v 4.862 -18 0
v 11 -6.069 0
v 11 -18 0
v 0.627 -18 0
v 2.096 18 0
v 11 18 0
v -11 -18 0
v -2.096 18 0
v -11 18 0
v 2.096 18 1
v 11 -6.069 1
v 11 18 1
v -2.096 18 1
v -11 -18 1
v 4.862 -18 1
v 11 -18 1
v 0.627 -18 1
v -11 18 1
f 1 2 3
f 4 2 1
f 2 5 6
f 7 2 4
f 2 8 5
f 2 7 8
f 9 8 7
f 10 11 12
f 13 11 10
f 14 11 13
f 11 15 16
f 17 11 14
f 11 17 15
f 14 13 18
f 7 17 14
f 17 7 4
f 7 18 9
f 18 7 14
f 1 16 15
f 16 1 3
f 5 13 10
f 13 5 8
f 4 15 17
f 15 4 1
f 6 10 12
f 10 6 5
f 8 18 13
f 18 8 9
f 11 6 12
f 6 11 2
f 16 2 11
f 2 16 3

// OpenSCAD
// Module names are of the form poly_<inkscape-path-id>().  As a result,
// you can associate a polygon in this OpenSCAD program with the corresponding
// SVG element in the Inkscape document by looking for the XML element with
// the attribute id="inkscape-path-id".

// fudge value is used to ensure that subtracted solids are a tad taller
// in the z dimension than the polygon being subtracted from.  This helps
// keep the resulting .stl file manifold.
fudge = 0.1;

module poly_path3442(h)
{
  scale([25.4/90, -25.4/90, 1]) union()
  {
    linear_extrude(height=h)
      polygon([[35.446744,-43.932999],[32.753868,-47.790245],[29.692586,-51.448744],[26.210267,-54.811237],[22.254283,-57.780464],[17.772004,-60.259166],[12.710801,-62.150084],[7.018043,-63.355958],[0.641102,-63.779529],[-2.584647,-63.612497],[-5.752129,-63.119857],[-8.840666,-62.314297],[-11.829583,-61.208501],[-14.698204,-59.815156],[-17.425853,-58.146948],[-19.991854,-56.216563],[-22.375532,-54.036687],[-24.556210,-51.620005],[-26.513213,-48.979205],[-28.225865,-46.126971],[-29.673489,-43.075990],[-30.835411,-39.838947],[-31.690954,-36.428530],[-32.219441,-32.857423],[-32.400199,-29.138313],[-32.202838,-25.226666],[-31.633312,-21.601776],[-30.725453,-18.250164],[-29.513095,-15.158349],[-28.030071,-12.312855],[-26.310214,-9.700201],[-22.295335,-5.119501],[-17.739124,-1.308417],[-12.912247,1.840880],[-8.085370,4.436223],[-3.529159,6.585441],[4.899079,10.704160],[8.281464,12.684232],[11.086805,14.772135],[13.298184,17.088386],[14.898684,19.753501],[15.871390,22.887998],[16.199385,26.612394],[15.923706,29.664785],[15.106696,32.323910],[13.763391,34.585540],[11.908827,36.445448],[9.558043,37.899403],[6.726075,38.943179],[3.427960,39.572545],[-0.321266,39.783273],[-4.311396,39.458371],[-7.882370,38.537227],[-11.066142,37.100186],[-13.894664,35.227592],[-16.399891,32.999791],[-18.613776,30.497127],[-22.295335,24.988587],[-38.976380,40.324542],[-37.973287,42.990010],[-35.643178,46.425095],[-32.102591,50.283046],[-27.468063,54.217113],[-21.856129,57.880546],[-15.383327,60.926594],[-11.860518,62.109738],[-8.166194,63.008506],[-4.314921,63.579552],[-0.321266,63.779532],[6.899940,63.211129],[13.961378,61.498873],[17.354062,60.210496],[20.613057,58.632191],[23.707116,56.762637],[26.604989,54.600512],[29.275427,52.144495],[31.687181,49.393265],[33.809004,46.345499],[35.609645,42.999877],[37.057857,39.355077],[38.122391,35.409777],[38.771997,31.162657],[38.975427,26.612394],[38.768042,21.789383],[38.165935,17.383687],[37.199181,13.368615],[35.897854,9.717472],[34.292028,6.403565],[32.411777,3.400200],[30.287174,0.680684],[27.948294,-1.781675],[22.747998,-6.041702],[17.051481,-9.593428],[11.099336,-12.650399],[5.132153,-15.426165],[-1.614448,-18.761171],[-4.138158,-20.288071],[-6.135572,-21.808628],[-7.636766,-23.388387],[-8.671813,-25.092891],[-9.270787,-26.987685],[-9.463762,-29.138313],[-9.266401,-31.468307],[-8.696875,-33.569953],[-7.789016,-35.417879],[-6.576658,-36.986713],[-5.093634,-38.251084],[-3.373777,-39.185619],[-1.450920,-39.764946],[0.641102,-39.963693],[4.105878,-39.710325],[7.096987,-38.985462],[9.697135,-37.841961],[11.989025,-36.332680],[14.055359,-34.510478],[15.978842,-32.428213],[19.728067,-27.694929],[35.446744,-43.932999]]);
  }
}

module poly_path3394(h)
{
  scale([25.4/90, -25.4/90, 1]) union()
  {
    linear_extrude(height=h)
      polygon([[24.554496,18.417140],[22.426617,23.400624],[20.142845,27.733442],[17.698808,31.411340],[15.090136,34.430065],[12.312457,36.785366],[9.361401,38.472989],[6.232597,39.488681],[2.921673,39.828190],[0.540498,39.627072],[-1.791323,39.035766],[-4.059403,38.072346],[-6.249353,36.754888],[-8.346787,35.101464],[-10.337318,33.130149],[-13.940117,28.306142],[-16.942652,22.427459],[-19.229824,15.638693],[-20.686533,8.084436],[-21.197680,-0.090719],[-20.732427,-7.737117],[-19.387175,-15.026287],[-17.237685,-21.754097],[-14.359719,-27.716417],[-10.829039,-32.709115],[-8.842606,-34.778066],[-6.721406,-36.528062],[-4.474907,-37.933587],[-2.112581,-38.969125],[0.356102,-39.609160],[2.921673,-39.828176],[6.052663,-39.530131],[9.017560,-38.634578],[11.825107,-37.139391],[14.484044,-35.042443],[17.003114,-32.341609],[19.391058,-29.034761],[21.656618,-25.119774],[23.808536,-20.594521],[37.608785,-35.654836],[34.812894,-41.447755],[31.419653,-46.785633],[27.507737,-51.570657],[23.155822,-55.705014],[18.442582,-59.090891],[13.446694,-61.630476],[8.246833,-63.225957],[2.921673,-63.779520],[-1.769469,-63.413121],[-6.231870,-62.345288],[-10.455331,-60.623068],[-14.429653,-58.293505],[-18.144637,-55.403646],[-21.590086,-52.000536],[-24.755800,-48.131222],[-27.631580,-43.842748],[-30.207228,-39.182160],[-32.472546,-34.196505],[-34.417334,-28.932829],[-36.031394,-23.438176],[-37.304527,-17.759593],[-38.226534,-11.944125],[-38.787218,-6.038818],[-38.976379,-0.090719],[-38.761266,6.397655],[-38.129647,12.708211],[-37.102101,18.807725],[-35.699209,24.662974],[-33.941548,30.240732],[-31.849699,35.507776],[-29.444241,40.430881],[-26.745753,44.976822],[-23.774816,49.112375],[-20.552008,52.804315],[-17.097909,56.019419],[-13.433098,58.724462],[-9.578155,60.886220],[-5.553659,62.471467],[-1.380190,63.446980],[2.921673,63.779534],[5.775630,63.620323],[8.596258,63.152257],[14.097466,61.346976],[19.345164,58.478513],[24.259220,54.661693],[28.759502,50.011339],[32.765877,44.642274],[36.198213,38.669323],[38.976377,32.207308],[24.554496,18.417140]]);
  }
}

module poly_path3464(h)
{
  scale([25.4/90, -25.4/90, 1]) union()
  {
    linear_extrude(height=h)
      polygon([[34.154558,63.779526],[34.154558,39.725532],[-8.208574,39.725532],[38.976378,-63.779535],[-28.529101,-63.779535],[-28.529101,-39.725540],[8.323380,-39.725540],[-38.976378,63.779526],[34.154558,63.779526]]);
  }
}

module poly_path3406(h)
{
  scale([25.4/90, -25.4/90, 1]) union()
  {
    linear_extrude(height=h)
      polygon([[38.976373,-6.985807],[-0.507841,-6.985807],[-0.507841,16.965537],[20.948211,16.965537],[20.948211,28.578310],[19.014072,31.353921],[17.020421,33.704260],[14.967257,35.646338],[12.854582,37.197164],[10.682395,38.373752],[8.450696,39.193110],[6.159485,39.672250],[3.808762,39.828183],[1.377170,39.627065],[-1.004022,39.035759],[-3.320122,38.072340],[-5.556440,36.754881],[-7.698282,35.101457],[-9.730957,33.130142],[-13.410037,28.306135],[-16.476144,22.427452],[-18.811741,15.638687],[-20.299293,8.084431],[-20.821262,-0.090723],[-20.299293,-8.258081],[-18.811741,-15.791782],[-16.476144,-22.551488],[-13.410037,-28.396857],[-9.730957,-33.187551],[-7.698282,-35.143539],[-5.556440,-36.783230],[-3.320122,-38.089082],[-1.004022,-39.043553],[1.377170,-39.629100],[3.808762,-39.828181],[6.601857,-39.597470],[9.275929,-38.901087],[11.842878,-37.732651],[14.314609,-36.085783],[16.703023,-33.954105],[19.020023,-31.331237],[21.277511,-28.210801],[23.487389,-24.586416],[36.183277,-41.642676],[33.349763,-46.240580],[30.035690,-50.459992],[26.308008,-54.228614],[22.233670,-57.474152],[17.879625,-60.124308],[13.312824,-62.106786],[8.600220,-63.349291],[3.808762,-63.779525],[-0.584183,-63.449008],[-4.846016,-62.479254],[-8.955721,-60.902955],[-12.892283,-58.752804],[-16.634688,-56.061494],[-20.161919,-52.861718],[-23.452962,-49.186168],[-26.486802,-45.067537],[-29.242424,-40.538518],[-31.698812,-35.631805],[-33.834951,-30.380089],[-35.629826,-24.816063],[-37.062422,-18.972421],[-38.111723,-12.881855],[-38.756715,-6.577058],[-38.976383,-0.090723],[-38.756715,6.397649],[-38.111723,12.708205],[-37.062422,18.807719],[-35.629826,24.662968],[-33.834951,30.240726],[-31.698812,35.507770],[-29.242424,40.430874],[-26.486802,44.976815],[-23.452962,49.112368],[-20.161919,52.804309],[-16.634688,56.019413],[-12.892283,58.724456],[-8.955721,60.886213],[-4.846016,62.471460],[-0.584183,63.446973],[3.808762,63.779527],[8.668162,63.331219],[13.570710,61.996218],[18.428623,59.789409],[23.154122,56.725675],[27.659426,52.819902],[31.856756,48.086974],[35.658332,42.541776],[38.976373,36.199192],[38.976373,-6.985807]]);
  }
}

module poly_path3391(h)
{
  scale([25.4/90, -25.4/90, 1]) union()
  {
    difference()
    {
       linear_extrude(height=h)
         polygon([[-38.976375,-63.779520],[-38.976375,63.779530],[2.220661,63.779530],[6.091071,63.558998],[9.823962,62.912171],[13.403853,61.861206],[16.815266,60.428258],[20.042720,58.635482],[23.070738,56.505034],[25.883838,54.059070],[28.466542,51.319745],[30.803370,48.309214],[32.878843,45.049634],[34.677482,41.563159],[36.183807,37.871946],[37.382339,33.998150],[38.257598,29.963926],[38.794105,25.791430],[38.976381,21.502817],[38.688030,16.187619],[37.846908,11.064613],[36.488908,6.172240],[34.649926,1.548936],[32.365855,-2.766860],[29.672589,-6.736708],[26.606023,-10.322171],[23.202051,-13.484810],[24.834043,-17.334359],[26.035304,-21.457250],[26.777119,-25.785146],[27.030772,-30.249713],[26.453771,-36.974680],[24.798149,-43.253333],[22.176971,-48.946866],[18.703304,-53.916472],[14.490215,-58.023347],[12.141721,-59.709883],[9.650772,-61.128684],[7.031501,-62.262398],[4.298041,-63.093677],[1.464526,-63.605167],[-1.454911,-63.779520],[-38.976375,-63.779520]]);
       translate([0, 0, -fudge])
         linear_extrude(height=h+2*fudge)
           polygon([[-17.076092,-20.956125],[-17.076092,-39.725528],[-1.454911,-39.725528],[-0.204595,-39.550063],[0.995470,-39.039329],[3.101266,-37.106012],[4.575324,-34.113499],[4.985715,-32.278770],[5.130488,-30.249713],[4.599253,-26.491277],[3.177841,-23.552863],[1.124689,-21.639477],[-0.058027,-21.131234],[-1.301763,-20.956125],[-17.076092,-20.956125]]);
       translate([0, 0, -fudge])
         linear_extrude(height=h+2*fudge)
           polygon([[-17.076092,39.725538],[-17.076092,3.280094],[2.526958,3.280094],[5.438581,3.637074],[8.159964,4.666729],[10.630087,6.307131],[12.787930,8.496349],[14.572473,11.172455],[15.922695,14.273522],[16.777577,17.737618],[17.076097,21.502817],[16.736897,25.828578],[15.740831,29.526509],[14.120205,32.617965],[11.907324,35.124301],[9.134493,37.066872],[5.834016,38.467032],[2.038198,39.346136],[-2.220656,39.725538],[-17.076092,39.725538]]);
    }
  }
}

module poly_path3412(h)
{
  scale([25.4/90, -25.4/90, 1]) union()
  {
    linear_extrude(height=h)
      polygon([[-38.976378,63.779534],[-10.629922,63.779534],[-10.629922,-63.779527],[-38.976378,-63.779527],[-38.976378,63.779534]]);
  }
}

module poly_path3418(h)
{
  scale([25.4/90, -25.4/90, 1]) union()
  {
    linear_extrude(height=h)
      polygon([[-20.761927,63.779532],[-20.761927,11.811028],[-15.412228,4.724414],[16.431218,63.779532],[38.976378,63.779532],[-2.420102,-12.537852],[35.664659,-63.416107],[10.062529,-63.416107],[-20.761927,-22.168379],[-20.761927,-63.779523],[-38.976378,-63.779523],[-38.976378,63.779532],[-20.761927,63.779532]]);
  }
}

module poly_path3424(h)
{
  scale([25.4/90, -25.4/90, 1]) union()
  {
    linear_extrude(height=h)
      polygon([[38.976381,-63.779526],[24.170966,-63.779526],[-0.056078,9.603167],[-24.170959,-63.779526],[-38.976375,-63.779526],[-38.976375,63.054758],[-22.937175,63.054758],[-22.937175,-5.979331],[-0.056078,63.779526],[22.937181,-5.798139],[22.937181,63.054758],[38.976381,63.054758],[38.976381,-63.779526]]);
  }
}

module poly_path3461(h)
{
  scale([25.4/90, -25.4/90, 1]) union()
  {
    linear_extrude(height=h)
      polygon([[19.921259,-63.779535],[-0.000000,-20.591681],[-19.921260,-63.779535],[-38.976378,-63.779535],[-7.687008,4.008995],[-7.687008,63.779526],[7.687008,63.779526],[7.687008,4.008995],[38.976377,-63.779535],[19.921259,-63.779535]]);
  }
}

module poly_path3430(h)
{
  scale([25.4/90, -25.4/90, 1]) union()
  {
    difference()
    {
       linear_extrude(height=h)
         polygon([[-0.000002,-63.779523],[-4.066601,-63.444544],[-7.997076,-62.462495],[-11.774009,-60.867714],[-15.379982,-58.694537],[-18.797576,-55.977301],[-22.009372,-52.750341],[-24.997953,-49.047995],[-27.745898,-44.904599],[-30.235791,-40.354489],[-32.450211,-35.432002],[-34.371741,-30.171474],[-35.982961,-24.607241],[-37.266454,-18.773641],[-38.204800,-12.705009],[-38.780582,-6.435682],[-38.976380,0.000004],[-38.775744,6.495579],[-38.186737,12.809357],[-37.228714,18.908600],[-35.921028,24.760566],[-34.283035,30.332518],[-32.334087,35.591715],[-30.093539,40.505418],[-27.580744,45.040889],[-24.815057,49.165386],[-21.815832,52.846172],[-18.602423,56.050507],[-15.194183,58.745651],[-11.610468,60.898865],[-7.870629,62.477409],[-3.994023,63.448545],[-0.000002,63.779532],[3.522265,63.504441],[7.048725,62.686089],[10.547444,61.334858],[13.986489,59.461126],[17.333925,57.075277],[20.557818,54.187689],[23.626233,50.808744],[26.507238,46.948823],[29.168897,42.618307],[31.579276,37.827576],[33.706442,32.587011],[35.518460,26.906992],[36.983397,20.797902],[38.069318,14.270120],[38.744289,7.334027],[38.976375,0.000004],[38.775739,-6.525515],[38.186732,-12.861519],[37.228709,-18.976066],[35.921024,-24.837216],[34.283030,-30.413027],[32.334082,-35.671559],[30.093534,-40.580870],[27.580740,-45.109021],[24.815053,-49.224069],[21.815828,-52.894075],[18.602418,-56.087097],[15.194179,-58.771195],[11.610463,-60.914427],[7.870625,-62.484854],[3.994018,-63.450532],[-0.000002,-63.779523]]);
       translate([0, 0, -fudge])
         linear_extrude(height=h+2*fudge)
           polygon([[-0.000002,-39.794060],[2.329359,-39.592699],[4.601949,-39.000862],[6.804864,-38.036913],[8.925203,-36.719219],[10.950061,-35.066146],[12.866538,-33.096060],[16.322732,-28.278312],[19.190565,-22.412904],[21.366815,-15.646763],[22.748260,-8.126818],[23.231680,0.000004],[22.694069,8.857207],[21.181016,16.719985],[18.842193,23.530843],[15.827270,29.232288],[12.285918,33.766826],[8.367808,37.076965],[6.314241,38.254918],[4.222611,39.105210],[2.111627,39.620656],[-0.000002,39.794068],[-2.347508,39.590712],[-4.633565,38.993417],[-6.845754,38.021350],[-8.971657,36.693675],[-10.998854,35.029555],[-12.914927,33.048157],[-16.364025,28.210180],[-19.219601,22.333060],[-21.382303,15.570113],[-22.752781,8.074656],[-23.231685,0.000004],[-22.757297,-8.022477],[-21.397786,-15.493447],[-19.248632,-22.253199],[-16.405314,-28.142031],[-12.963312,-33.000237],[-11.047642,-34.992948],[-9.018107,-36.668114],[-6.886640,-38.005771],[-4.665177,-38.985956],[-2.365653,-39.588707],[-0.000002,-39.794060]]);
    }
  }
}

module poly_path3409(h)
{
  scale([25.4/90, -25.4/90, 1]) union()
  {
    linear_extrude(height=h)
      polygon([[19.454057,63.779534],[38.976376,63.779534],[38.976376,-63.779527],[19.454057,-63.779527],[19.454057,-12.573676],[-19.454062,-12.573676],[-19.454062,-63.779527],[-38.976381,-63.779527],[-38.976381,63.779534],[-19.454062,63.779534],[-19.454062,11.480318],[19.454057,11.480318],[19.454057,63.779534]]);
  }
}

module poly_path3436(h)
{
  scale([25.4/90, -25.4/90, 1]) union()
  {
    difference()
    {
       linear_extrude(height=h)
         polygon([[18.371679,63.416113],[38.976379,63.416113],[24.969243,40.339190],[28.218860,31.966424],[30.716736,22.418233],[32.320135,11.745724],[32.886320,0.000002],[32.701358,-6.495573],[32.158367,-12.809351],[31.275190,-18.908593],[30.069667,-24.760560],[28.559642,-30.332511],[26.762956,-35.591709],[24.697450,-40.505412],[22.380968,-45.040882],[19.831350,-49.165380],[17.066440,-52.846166],[14.104078,-56.050501],[10.962107,-58.745645],[7.658369,-60.898859],[4.210706,-62.477403],[0.636959,-63.448538],[-3.045029,-63.779526],[-6.793924,-63.442550],[-10.417331,-62.455044],[-13.899191,-60.852145],[-17.223448,-58.668987],[-20.374042,-55.940704],[-23.334917,-52.702432],[-26.090015,-48.989306],[-28.623277,-44.836461],[-30.918647,-40.279031],[-32.960065,-35.352152],[-34.731476,-30.090959],[-36.216820,-24.530586],[-37.400039,-18.706168],[-38.265078,-12.652841],[-38.795876,-6.405739],[-38.976378,0.000002],[-38.791416,6.495577],[-38.248425,12.809355],[-37.365248,18.908597],[-36.159725,24.760564],[-34.649700,30.332515],[-32.853013,35.591712],[-30.787508,40.505416],[-28.471026,45.040886],[-25.921408,49.165384],[-23.156497,52.846170],[-20.194136,56.050505],[-17.052165,58.745649],[-13.748427,60.898862],[-10.300763,62.477407],[-6.727017,63.448542],[-3.045029,63.779530],[1.303654,63.302546],[5.633305,61.871595],[9.886831,59.486677],[14.007137,56.147791],[18.371679,63.416113]]);
       translate([0, 0, -fudge])
         linear_extrude(height=h+2*fudge)
           polygon([[6.902068,10.357361],[-13.601131,10.357361],[3.146531,38.158694],[0.050751,39.385223],[-3.045029,39.794066],[-5.209136,39.590709],[-7.316595,38.993415],[-9.355957,38.021348],[-11.315773,36.693672],[-14.950975,33.048155],[-18.130613,28.210178],[-20.763096,22.333058],[-22.756837,15.570111],[-24.020247,8.074654],[-24.461737,0.000002],[-24.024410,-8.022480],[-22.771111,-15.493449],[-20.789859,-22.253202],[-18.168676,-28.142033],[-14.995580,-33.000239],[-13.229572,-34.992950],[-11.358594,-36.668116],[-9.393648,-38.005773],[-7.345737,-38.985958],[-5.225863,-39.588709],[-3.045029,-39.794062],[-0.897649,-39.590705],[1.197395,-38.993411],[3.228208,-38.021344],[5.182895,-36.693669],[8.816313,-33.048151],[12.002492,-28.210174],[14.646276,-22.333054],[16.652506,-15.570107],[17.926026,-8.074650],[18.371679,0.000002],[18.097309,6.569884],[17.318606,12.628712],[16.102180,18.142416],[14.514641,23.076925],[6.902068,10.357361]]);
    }
  }
}

module poly_path3400(h)
{
  scale([25.4/90, -25.4/90, 1]) union()
  {
    linear_extrude(height=h)
      polygon([[-38.976381,63.779530],[38.976375,63.779530],[38.976375,39.725538],[-15.992372,39.725538],[-15.992372,11.480320],[28.207644,11.480320],[28.207644,-12.573674],[-15.992372,-12.573674],[-15.992372,-39.725528],[38.815648,-39.725528],[38.815648,-63.779520],[-38.976381,-63.779520],[-38.976381,63.779530]]);
  }
}

module poly_path3454(h)
{
  scale([25.4/90, -25.4/90, 1]) union()
  {
    linear_extrude(height=h)
      polygon([[38.976382,-63.779526],[26.520887,-63.779526],[17.793568,12.027001],[5.253342,-63.779526],[-5.253334,-63.779526],[-17.793560,12.027001],[-26.520879,-63.779526],[-38.976374,-63.779526],[-24.233135,63.779534],[-13.641728,63.779534],[0.000004,-18.587173],[13.557005,63.779534],[24.233143,63.779534],[38.976382,-63.779526]]);
  }
}

module poly_path3457(h)
{
  scale([25.4/90, -25.4/90, 1]) union()
  {
    linear_extrude(height=h)
      polygon([[-22.116611,63.779534],[-0.142080,11.115865],[22.116605,63.779534],[38.976374,63.779534],[8.666676,-8.200221],[32.156692,-63.779526],[15.202205,-63.779526],[0.142073,-28.062989],[-14.918058,-63.779526],[-31.872545,-63.779526],[-8.571965,-8.746903],[-38.976381,63.779534],[-22.116611,63.779534]]);
  }
}

module poly_path3403(h)
{
  scale([25.4/90, -25.4/90, 1]) union()
  {
    linear_extrude(height=h)
      polygon([[27.792578,-12.646723],[-15.106477,-12.646723],[-15.106477,-39.759847],[38.976378,-39.759847],[38.976378,-63.779527],[-38.976378,-63.779527],[-38.976378,63.779532],[-15.106477,63.779532],[-15.106477,11.372957],[27.792578,11.372957],[27.792578,-12.646723]]);
  }
}

module poly_path3397(h)
{
  scale([25.4/90, -25.4/90, 1]) union()
  {
    difference()
    {
       linear_extrude(height=h)
         polygon([[-38.976382,-63.779520],[-38.976382,63.779530],[-13.989606,63.779530],[-7.551100,63.457652],[-1.532747,62.511414],[4.066111,60.969912],[9.246131,58.862243],[14.007972,56.217501],[18.352289,53.064784],[22.279742,49.433186],[25.790987,45.351803],[28.886682,40.849732],[31.567484,35.956068],[33.834051,30.699907],[35.687041,25.110346],[37.127110,19.216478],[38.154917,13.047402],[38.771119,6.632212],[38.976374,0.000004],[38.784087,-6.662233],[38.202551,-13.099712],[37.224751,-19.284137],[35.843675,-25.187213],[34.052310,-30.780646],[31.843640,-36.036139],[29.210654,-40.925398],[26.146338,-45.420129],[22.643677,-49.492035],[18.695659,-53.112822],[14.295270,-56.254195],[9.435496,-58.887858],[4.109324,-60.985518],[-1.690259,-62.518878],[-7.970267,-63.459644],[-14.737713,-63.779520],[-38.976382,-63.779520]]);
       translate([0, 0, -fudge])
         linear_extrude(height=h+2*fudge)
           polygon([[-17.580520,39.725538],[-17.580520,-39.725528],[-14.737713,-39.725528],[-10.528296,-39.559673],[-6.647637,-39.064954],[-3.087845,-38.245644],[0.158969,-37.106012],[3.100695,-35.650330],[5.745224,-33.882868],[8.100446,-31.807898],[10.174252,-29.429691],[11.974531,-26.752517],[13.509173,-23.780647],[14.786069,-20.518353],[15.813109,-16.969905],[17.149181,-9.031632],[17.580512,0.000004],[17.119958,8.874684],[15.719595,16.739283],[14.658219,20.276119],[13.351369,23.540416],[11.795540,26.525499],[9.987225,29.224695],[7.922917,31.631331],[5.599110,33.738734],[3.012296,35.540229],[0.158969,37.029145],[-2.964378,38.198807],[-6.361252,39.042542],[-10.035159,39.553677],[-13.989606,39.725538],[-17.580520,39.725538]]);
    }
  }
}

module poly_path3415(h)
{
  scale([25.4/90, -25.4/90, 1]) union()
  {
    linear_extrude(height=h)
      polygon([[38.974783,-63.779525],[11.098204,-63.779525],[11.098204,25.675116],[10.917850,29.356913],[10.272432,32.402926],[9.223204,34.857812],[7.831417,36.766222],[6.158323,38.172810],[4.265175,39.122231],[2.213225,39.659137],[0.063724,39.828183],[-2.782237,39.433743],[-5.426292,38.305708],[-7.739132,36.527006],[-9.591445,34.180565],[-10.853922,31.349314],[-11.397252,28.116180],[-11.092125,24.564092],[-9.809231,20.775978],[-38.266572,20.775978],[-38.867609,25.026576],[-38.946018,29.187867],[-38.528170,33.234334],[-37.640438,37.140461],[-36.309194,40.880733],[-34.560811,44.429631],[-32.421661,47.761641],[-29.918117,50.851245],[-27.076552,53.672928],[-23.923337,56.201172],[-20.484845,58.410463],[-16.787450,60.275282],[-12.857523,61.770115],[-8.721436,62.869444],[-4.405563,63.547754],[0.063724,63.779527],[4.075888,63.591300],[7.968667,63.039199],[11.722494,62.142096],[15.317803,60.918861],[18.735026,59.388368],[21.954597,57.569486],[24.956950,55.481089],[27.722518,53.142046],[30.231733,50.571230],[32.465030,47.787511],[34.402841,44.809763],[36.025600,41.656855],[37.313741,38.347659],[38.247696,34.901048],[38.807898,31.335891],[38.974783,27.671062],[38.974783,-63.779525]]);
  }
}

module poly_path3421(h)
{
  scale([25.4/90, -25.4/90, 1]) union()
  {
    linear_extrude(height=h)
      polygon([[-38.976377,-63.779529],[-38.976377,63.779532],[38.976377,63.779532],[38.976377,39.725537],[-10.393701,39.725537],[-10.393701,-63.779529],[-38.976377,-63.779529]]);
  }
}

module poly_path3445(h)
{
  scale([25.4/90, -25.4/90, 1]) union()
  {
    linear_extrude(height=h)
      polygon([[10.589812,63.779530],[10.589812,-39.725537],[38.976381,-39.725537],[38.976381,-63.779532],[-38.976375,-63.779532],[-38.976375,-39.725537],[-10.442724,-39.725537],[-10.442724,63.779530],[10.589812,63.779530]]);
  }
}

module poly_path3427(h)
{
  scale([25.4/90, -25.4/90, 1]) union()
  {
    linear_extrude(height=h)
      polygon([[-19.556088,-15.853768],[21.321577,63.779531],[38.976382,63.779531],[38.976382,-63.779530],[19.556097,-63.779530],[19.556097,15.489316],[-21.049956,-63.779530],[-38.976373,-63.779530],[-38.976373,63.779531],[-19.556088,63.779531],[-19.556088,-15.853768]]);
  }
}

module poly_path3433(h)
{
  scale([25.4/90, -25.4/90, 1]) union()
  {
    difference()
    {
       linear_extrude(height=h)
         polygon([[-38.976378,-63.779523],[-38.976378,63.779531],[-15.849316,63.779531],[-15.849316,11.744110],[4.528375,11.744110],[8.060167,11.546316],[11.487721,10.966345],[14.793979,10.024311],[17.961883,8.740329],[20.974378,7.134513],[23.814405,5.226978],[26.464907,3.037839],[28.908828,0.587210],[31.129109,-2.104795],[33.108694,-5.018060],[34.830525,-8.132471],[36.277546,-11.427914],[37.432699,-14.884273],[38.278927,-18.481435],[38.799172,-22.199284],[38.976377,-26.017706],[38.790959,-29.693738],[38.251130,-33.371888],[37.381527,-37.003456],[36.206790,-40.539745],[34.751557,-43.932055],[33.040465,-47.131688],[31.098153,-50.089947],[28.949259,-52.758131],[26.652852,-55.047314],[24.041834,-57.148055],[21.165482,-59.024360],[18.073071,-60.640233],[14.813879,-61.959680],[11.437181,-62.946707],[7.992254,-63.565320],[4.528375,-63.779523],[-38.976378,-63.779523]]);
       translate([0, 0, -fudge])
         linear_extrude(height=h+2*fudge)
           polygon([[-15.849316,-12.105458],[-15.849316,-39.929954],[4.528375,-39.929954],[6.747077,-39.740807],[8.692864,-39.094316],[10.578003,-37.871913],[12.614761,-35.955026],[13.870678,-34.072017],[14.899165,-31.731665],[15.594089,-29.018664],[15.849315,-26.017706],[15.614936,-23.085562],[14.944651,-20.413848],[13.887735,-18.042795],[12.493465,-16.012632],[10.811118,-14.363587],[8.889970,-13.135891],[6.779297,-12.369771],[4.528375,-12.105458],[-15.849316,-12.105458]]);
    }
  }
}

module poly_path3448(h)
{
  scale([25.4/90, -25.4/90, 1]) union()
  {
    linear_extrude(height=h)
      polygon([[-18.777535,-63.779526],[-38.967969,-63.779526],[-38.967969,12.071268],[-38.958318,14.167482],[-38.599547,19.821313],[-37.396934,27.877856],[-36.324586,32.446236],[-34.855757,37.182204],[-32.928605,41.941397],[-30.481291,46.579452],[-27.451975,50.952004],[-23.778815,54.914692],[-19.399972,58.323152],[-14.253605,61.033020],[-8.277873,62.899933],[-1.410937,63.779528],[1.412900,63.779528],[8.256568,62.899889],[14.215030,61.032668],[19.349504,58.321964],[23.721212,54.911877],[27.391373,50.946506],[30.421207,46.569951],[32.871933,41.926310],[34.804772,37.159683],[36.280944,32.414170],[37.361669,27.833870],[38.581654,19.745305],[38.954489,14.046783],[38.969932,11.891099],[38.969932,-63.779526],[18.779497,-63.779526],[18.779497,15.314294],[17.846308,22.160684],[16.811360,26.132829],[15.232052,30.088083],[12.984289,33.739304],[9.943976,36.799347],[8.087834,38.017945],[5.987019,38.981071],[3.626020,39.652831],[0.989324,39.997332],[-0.987362,39.997332],[-4.002545,39.563142],[-6.656821,38.702725],[-8.973147,37.471239],[-10.974479,35.923842],[-12.683776,34.115695],[-14.123995,32.101955],[-16.289028,27.678334],[-17.653240,23.094251],[-18.400288,18.790977],[-18.777535,12.791940],[-18.777535,-63.779526]]);
  }
}

module poly_path3439(h)
{
  scale([25.4/90, -25.4/90, 1]) union()
  {
    difference()
    {
       linear_extrude(height=h)
         polygon([[-9.367436,5.239682],[17.228210,63.779531],[38.976374,63.779531],[11.070598,2.348825],[14.324685,0.004592],[17.279387,-2.921907],[19.893251,-6.369267],[22.124823,-10.276088],[23.932649,-14.580966],[25.275277,-19.222499],[26.111252,-24.139285],[26.399123,-29.269920],[25.916268,-36.147703],[24.501481,-42.589317],[22.205426,-48.446548],[19.078770,-53.571185],[17.219798,-55.812463],[15.172176,-57.815013],[12.942235,-59.560308],[10.536310,-61.029821],[7.960733,-62.205025],[5.221838,-63.067395],[2.325957,-63.598403],[-0.720576,-63.779523],[-38.976382,-63.779523],[-38.976382,63.779531],[-20.241518,63.779531],[-20.241518,5.239682],[-9.367436,5.239682]]);
       translate([0, 0, -fudge])
         linear_extrude(height=h+2*fudge)
           polygon([[-20.241518,-18.790565],[-20.241518,-39.929954],[-0.327536,-39.929954],[1.311662,-39.753863],[2.861812,-39.232648],[4.282997,-38.376895],[5.535297,-37.197191],[6.578795,-35.704123],[7.373574,-33.908277],[7.879714,-31.820240],[8.057298,-29.450599],[7.561905,-24.888465],[6.938058,-23.060507],[6.059349,-21.545912],[4.922709,-20.353152],[3.525066,-19.490694],[1.863350,-18.967008],[-0.065510,-18.790565],[-20.241518,-18.790565]]);
    }
  }
}

module poly_path3388(h)
{
  scale([25.4/90, -25.4/90, 1]) union()
  {
    difference()
    {
       linear_extrude(height=h)
         polygon([[-21.474430,63.779526],[-12.493167,27.516307],[12.493167,27.516307],[21.474429,63.779526],[38.976378,63.779526],[7.426813,-63.779532],[-7.426814,-63.779532],[-38.976379,63.779526],[-21.474430,63.779526]]);
       translate([0, 0, -fudge])
         linear_extrude(height=h+2*fudge)
           polygon([[-6.505659,3.462316],[0.057572,-23.142860],[6.620802,3.462316],[-6.505659,3.462316]]);
    }
  }
}

module poly_path3451(h)
{
  scale([25.4/90, -25.4/90, 1]) union()
  {
    linear_extrude(height=h)
      polygon([[-7.209160,63.779534],[7.209169,63.779534],[38.976383,-63.779526],[21.275832,-63.779526],[0.058616,21.320590],[-21.158601,-63.779526],[-38.976374,-63.779526],[-7.209160,63.779535]]);
  }
}

poly_path3442(1);
poly_path3394(1);
poly_path3464(1);
poly_path3406(1);
poly_path3391(1);
poly_path3412(1);
poly_path3418(1);
poly_path3424(1);
poly_path3461(1);
poly_path3430(1);
poly_path3409(1);
poly_path3436(1);
poly_path3400(1);
poly_path3454(1);
poly_path3457(1);
poly_path3403(1);
poly_path3397(1);
poly_path3415(1);
poly_path3421(1);
poly_path3445(1);
poly_path3427(1);
poly_path3433(1);
poly_path3448(1);
poly_path3439(1);
poly_path3388(1);
poly_path3451(1);
